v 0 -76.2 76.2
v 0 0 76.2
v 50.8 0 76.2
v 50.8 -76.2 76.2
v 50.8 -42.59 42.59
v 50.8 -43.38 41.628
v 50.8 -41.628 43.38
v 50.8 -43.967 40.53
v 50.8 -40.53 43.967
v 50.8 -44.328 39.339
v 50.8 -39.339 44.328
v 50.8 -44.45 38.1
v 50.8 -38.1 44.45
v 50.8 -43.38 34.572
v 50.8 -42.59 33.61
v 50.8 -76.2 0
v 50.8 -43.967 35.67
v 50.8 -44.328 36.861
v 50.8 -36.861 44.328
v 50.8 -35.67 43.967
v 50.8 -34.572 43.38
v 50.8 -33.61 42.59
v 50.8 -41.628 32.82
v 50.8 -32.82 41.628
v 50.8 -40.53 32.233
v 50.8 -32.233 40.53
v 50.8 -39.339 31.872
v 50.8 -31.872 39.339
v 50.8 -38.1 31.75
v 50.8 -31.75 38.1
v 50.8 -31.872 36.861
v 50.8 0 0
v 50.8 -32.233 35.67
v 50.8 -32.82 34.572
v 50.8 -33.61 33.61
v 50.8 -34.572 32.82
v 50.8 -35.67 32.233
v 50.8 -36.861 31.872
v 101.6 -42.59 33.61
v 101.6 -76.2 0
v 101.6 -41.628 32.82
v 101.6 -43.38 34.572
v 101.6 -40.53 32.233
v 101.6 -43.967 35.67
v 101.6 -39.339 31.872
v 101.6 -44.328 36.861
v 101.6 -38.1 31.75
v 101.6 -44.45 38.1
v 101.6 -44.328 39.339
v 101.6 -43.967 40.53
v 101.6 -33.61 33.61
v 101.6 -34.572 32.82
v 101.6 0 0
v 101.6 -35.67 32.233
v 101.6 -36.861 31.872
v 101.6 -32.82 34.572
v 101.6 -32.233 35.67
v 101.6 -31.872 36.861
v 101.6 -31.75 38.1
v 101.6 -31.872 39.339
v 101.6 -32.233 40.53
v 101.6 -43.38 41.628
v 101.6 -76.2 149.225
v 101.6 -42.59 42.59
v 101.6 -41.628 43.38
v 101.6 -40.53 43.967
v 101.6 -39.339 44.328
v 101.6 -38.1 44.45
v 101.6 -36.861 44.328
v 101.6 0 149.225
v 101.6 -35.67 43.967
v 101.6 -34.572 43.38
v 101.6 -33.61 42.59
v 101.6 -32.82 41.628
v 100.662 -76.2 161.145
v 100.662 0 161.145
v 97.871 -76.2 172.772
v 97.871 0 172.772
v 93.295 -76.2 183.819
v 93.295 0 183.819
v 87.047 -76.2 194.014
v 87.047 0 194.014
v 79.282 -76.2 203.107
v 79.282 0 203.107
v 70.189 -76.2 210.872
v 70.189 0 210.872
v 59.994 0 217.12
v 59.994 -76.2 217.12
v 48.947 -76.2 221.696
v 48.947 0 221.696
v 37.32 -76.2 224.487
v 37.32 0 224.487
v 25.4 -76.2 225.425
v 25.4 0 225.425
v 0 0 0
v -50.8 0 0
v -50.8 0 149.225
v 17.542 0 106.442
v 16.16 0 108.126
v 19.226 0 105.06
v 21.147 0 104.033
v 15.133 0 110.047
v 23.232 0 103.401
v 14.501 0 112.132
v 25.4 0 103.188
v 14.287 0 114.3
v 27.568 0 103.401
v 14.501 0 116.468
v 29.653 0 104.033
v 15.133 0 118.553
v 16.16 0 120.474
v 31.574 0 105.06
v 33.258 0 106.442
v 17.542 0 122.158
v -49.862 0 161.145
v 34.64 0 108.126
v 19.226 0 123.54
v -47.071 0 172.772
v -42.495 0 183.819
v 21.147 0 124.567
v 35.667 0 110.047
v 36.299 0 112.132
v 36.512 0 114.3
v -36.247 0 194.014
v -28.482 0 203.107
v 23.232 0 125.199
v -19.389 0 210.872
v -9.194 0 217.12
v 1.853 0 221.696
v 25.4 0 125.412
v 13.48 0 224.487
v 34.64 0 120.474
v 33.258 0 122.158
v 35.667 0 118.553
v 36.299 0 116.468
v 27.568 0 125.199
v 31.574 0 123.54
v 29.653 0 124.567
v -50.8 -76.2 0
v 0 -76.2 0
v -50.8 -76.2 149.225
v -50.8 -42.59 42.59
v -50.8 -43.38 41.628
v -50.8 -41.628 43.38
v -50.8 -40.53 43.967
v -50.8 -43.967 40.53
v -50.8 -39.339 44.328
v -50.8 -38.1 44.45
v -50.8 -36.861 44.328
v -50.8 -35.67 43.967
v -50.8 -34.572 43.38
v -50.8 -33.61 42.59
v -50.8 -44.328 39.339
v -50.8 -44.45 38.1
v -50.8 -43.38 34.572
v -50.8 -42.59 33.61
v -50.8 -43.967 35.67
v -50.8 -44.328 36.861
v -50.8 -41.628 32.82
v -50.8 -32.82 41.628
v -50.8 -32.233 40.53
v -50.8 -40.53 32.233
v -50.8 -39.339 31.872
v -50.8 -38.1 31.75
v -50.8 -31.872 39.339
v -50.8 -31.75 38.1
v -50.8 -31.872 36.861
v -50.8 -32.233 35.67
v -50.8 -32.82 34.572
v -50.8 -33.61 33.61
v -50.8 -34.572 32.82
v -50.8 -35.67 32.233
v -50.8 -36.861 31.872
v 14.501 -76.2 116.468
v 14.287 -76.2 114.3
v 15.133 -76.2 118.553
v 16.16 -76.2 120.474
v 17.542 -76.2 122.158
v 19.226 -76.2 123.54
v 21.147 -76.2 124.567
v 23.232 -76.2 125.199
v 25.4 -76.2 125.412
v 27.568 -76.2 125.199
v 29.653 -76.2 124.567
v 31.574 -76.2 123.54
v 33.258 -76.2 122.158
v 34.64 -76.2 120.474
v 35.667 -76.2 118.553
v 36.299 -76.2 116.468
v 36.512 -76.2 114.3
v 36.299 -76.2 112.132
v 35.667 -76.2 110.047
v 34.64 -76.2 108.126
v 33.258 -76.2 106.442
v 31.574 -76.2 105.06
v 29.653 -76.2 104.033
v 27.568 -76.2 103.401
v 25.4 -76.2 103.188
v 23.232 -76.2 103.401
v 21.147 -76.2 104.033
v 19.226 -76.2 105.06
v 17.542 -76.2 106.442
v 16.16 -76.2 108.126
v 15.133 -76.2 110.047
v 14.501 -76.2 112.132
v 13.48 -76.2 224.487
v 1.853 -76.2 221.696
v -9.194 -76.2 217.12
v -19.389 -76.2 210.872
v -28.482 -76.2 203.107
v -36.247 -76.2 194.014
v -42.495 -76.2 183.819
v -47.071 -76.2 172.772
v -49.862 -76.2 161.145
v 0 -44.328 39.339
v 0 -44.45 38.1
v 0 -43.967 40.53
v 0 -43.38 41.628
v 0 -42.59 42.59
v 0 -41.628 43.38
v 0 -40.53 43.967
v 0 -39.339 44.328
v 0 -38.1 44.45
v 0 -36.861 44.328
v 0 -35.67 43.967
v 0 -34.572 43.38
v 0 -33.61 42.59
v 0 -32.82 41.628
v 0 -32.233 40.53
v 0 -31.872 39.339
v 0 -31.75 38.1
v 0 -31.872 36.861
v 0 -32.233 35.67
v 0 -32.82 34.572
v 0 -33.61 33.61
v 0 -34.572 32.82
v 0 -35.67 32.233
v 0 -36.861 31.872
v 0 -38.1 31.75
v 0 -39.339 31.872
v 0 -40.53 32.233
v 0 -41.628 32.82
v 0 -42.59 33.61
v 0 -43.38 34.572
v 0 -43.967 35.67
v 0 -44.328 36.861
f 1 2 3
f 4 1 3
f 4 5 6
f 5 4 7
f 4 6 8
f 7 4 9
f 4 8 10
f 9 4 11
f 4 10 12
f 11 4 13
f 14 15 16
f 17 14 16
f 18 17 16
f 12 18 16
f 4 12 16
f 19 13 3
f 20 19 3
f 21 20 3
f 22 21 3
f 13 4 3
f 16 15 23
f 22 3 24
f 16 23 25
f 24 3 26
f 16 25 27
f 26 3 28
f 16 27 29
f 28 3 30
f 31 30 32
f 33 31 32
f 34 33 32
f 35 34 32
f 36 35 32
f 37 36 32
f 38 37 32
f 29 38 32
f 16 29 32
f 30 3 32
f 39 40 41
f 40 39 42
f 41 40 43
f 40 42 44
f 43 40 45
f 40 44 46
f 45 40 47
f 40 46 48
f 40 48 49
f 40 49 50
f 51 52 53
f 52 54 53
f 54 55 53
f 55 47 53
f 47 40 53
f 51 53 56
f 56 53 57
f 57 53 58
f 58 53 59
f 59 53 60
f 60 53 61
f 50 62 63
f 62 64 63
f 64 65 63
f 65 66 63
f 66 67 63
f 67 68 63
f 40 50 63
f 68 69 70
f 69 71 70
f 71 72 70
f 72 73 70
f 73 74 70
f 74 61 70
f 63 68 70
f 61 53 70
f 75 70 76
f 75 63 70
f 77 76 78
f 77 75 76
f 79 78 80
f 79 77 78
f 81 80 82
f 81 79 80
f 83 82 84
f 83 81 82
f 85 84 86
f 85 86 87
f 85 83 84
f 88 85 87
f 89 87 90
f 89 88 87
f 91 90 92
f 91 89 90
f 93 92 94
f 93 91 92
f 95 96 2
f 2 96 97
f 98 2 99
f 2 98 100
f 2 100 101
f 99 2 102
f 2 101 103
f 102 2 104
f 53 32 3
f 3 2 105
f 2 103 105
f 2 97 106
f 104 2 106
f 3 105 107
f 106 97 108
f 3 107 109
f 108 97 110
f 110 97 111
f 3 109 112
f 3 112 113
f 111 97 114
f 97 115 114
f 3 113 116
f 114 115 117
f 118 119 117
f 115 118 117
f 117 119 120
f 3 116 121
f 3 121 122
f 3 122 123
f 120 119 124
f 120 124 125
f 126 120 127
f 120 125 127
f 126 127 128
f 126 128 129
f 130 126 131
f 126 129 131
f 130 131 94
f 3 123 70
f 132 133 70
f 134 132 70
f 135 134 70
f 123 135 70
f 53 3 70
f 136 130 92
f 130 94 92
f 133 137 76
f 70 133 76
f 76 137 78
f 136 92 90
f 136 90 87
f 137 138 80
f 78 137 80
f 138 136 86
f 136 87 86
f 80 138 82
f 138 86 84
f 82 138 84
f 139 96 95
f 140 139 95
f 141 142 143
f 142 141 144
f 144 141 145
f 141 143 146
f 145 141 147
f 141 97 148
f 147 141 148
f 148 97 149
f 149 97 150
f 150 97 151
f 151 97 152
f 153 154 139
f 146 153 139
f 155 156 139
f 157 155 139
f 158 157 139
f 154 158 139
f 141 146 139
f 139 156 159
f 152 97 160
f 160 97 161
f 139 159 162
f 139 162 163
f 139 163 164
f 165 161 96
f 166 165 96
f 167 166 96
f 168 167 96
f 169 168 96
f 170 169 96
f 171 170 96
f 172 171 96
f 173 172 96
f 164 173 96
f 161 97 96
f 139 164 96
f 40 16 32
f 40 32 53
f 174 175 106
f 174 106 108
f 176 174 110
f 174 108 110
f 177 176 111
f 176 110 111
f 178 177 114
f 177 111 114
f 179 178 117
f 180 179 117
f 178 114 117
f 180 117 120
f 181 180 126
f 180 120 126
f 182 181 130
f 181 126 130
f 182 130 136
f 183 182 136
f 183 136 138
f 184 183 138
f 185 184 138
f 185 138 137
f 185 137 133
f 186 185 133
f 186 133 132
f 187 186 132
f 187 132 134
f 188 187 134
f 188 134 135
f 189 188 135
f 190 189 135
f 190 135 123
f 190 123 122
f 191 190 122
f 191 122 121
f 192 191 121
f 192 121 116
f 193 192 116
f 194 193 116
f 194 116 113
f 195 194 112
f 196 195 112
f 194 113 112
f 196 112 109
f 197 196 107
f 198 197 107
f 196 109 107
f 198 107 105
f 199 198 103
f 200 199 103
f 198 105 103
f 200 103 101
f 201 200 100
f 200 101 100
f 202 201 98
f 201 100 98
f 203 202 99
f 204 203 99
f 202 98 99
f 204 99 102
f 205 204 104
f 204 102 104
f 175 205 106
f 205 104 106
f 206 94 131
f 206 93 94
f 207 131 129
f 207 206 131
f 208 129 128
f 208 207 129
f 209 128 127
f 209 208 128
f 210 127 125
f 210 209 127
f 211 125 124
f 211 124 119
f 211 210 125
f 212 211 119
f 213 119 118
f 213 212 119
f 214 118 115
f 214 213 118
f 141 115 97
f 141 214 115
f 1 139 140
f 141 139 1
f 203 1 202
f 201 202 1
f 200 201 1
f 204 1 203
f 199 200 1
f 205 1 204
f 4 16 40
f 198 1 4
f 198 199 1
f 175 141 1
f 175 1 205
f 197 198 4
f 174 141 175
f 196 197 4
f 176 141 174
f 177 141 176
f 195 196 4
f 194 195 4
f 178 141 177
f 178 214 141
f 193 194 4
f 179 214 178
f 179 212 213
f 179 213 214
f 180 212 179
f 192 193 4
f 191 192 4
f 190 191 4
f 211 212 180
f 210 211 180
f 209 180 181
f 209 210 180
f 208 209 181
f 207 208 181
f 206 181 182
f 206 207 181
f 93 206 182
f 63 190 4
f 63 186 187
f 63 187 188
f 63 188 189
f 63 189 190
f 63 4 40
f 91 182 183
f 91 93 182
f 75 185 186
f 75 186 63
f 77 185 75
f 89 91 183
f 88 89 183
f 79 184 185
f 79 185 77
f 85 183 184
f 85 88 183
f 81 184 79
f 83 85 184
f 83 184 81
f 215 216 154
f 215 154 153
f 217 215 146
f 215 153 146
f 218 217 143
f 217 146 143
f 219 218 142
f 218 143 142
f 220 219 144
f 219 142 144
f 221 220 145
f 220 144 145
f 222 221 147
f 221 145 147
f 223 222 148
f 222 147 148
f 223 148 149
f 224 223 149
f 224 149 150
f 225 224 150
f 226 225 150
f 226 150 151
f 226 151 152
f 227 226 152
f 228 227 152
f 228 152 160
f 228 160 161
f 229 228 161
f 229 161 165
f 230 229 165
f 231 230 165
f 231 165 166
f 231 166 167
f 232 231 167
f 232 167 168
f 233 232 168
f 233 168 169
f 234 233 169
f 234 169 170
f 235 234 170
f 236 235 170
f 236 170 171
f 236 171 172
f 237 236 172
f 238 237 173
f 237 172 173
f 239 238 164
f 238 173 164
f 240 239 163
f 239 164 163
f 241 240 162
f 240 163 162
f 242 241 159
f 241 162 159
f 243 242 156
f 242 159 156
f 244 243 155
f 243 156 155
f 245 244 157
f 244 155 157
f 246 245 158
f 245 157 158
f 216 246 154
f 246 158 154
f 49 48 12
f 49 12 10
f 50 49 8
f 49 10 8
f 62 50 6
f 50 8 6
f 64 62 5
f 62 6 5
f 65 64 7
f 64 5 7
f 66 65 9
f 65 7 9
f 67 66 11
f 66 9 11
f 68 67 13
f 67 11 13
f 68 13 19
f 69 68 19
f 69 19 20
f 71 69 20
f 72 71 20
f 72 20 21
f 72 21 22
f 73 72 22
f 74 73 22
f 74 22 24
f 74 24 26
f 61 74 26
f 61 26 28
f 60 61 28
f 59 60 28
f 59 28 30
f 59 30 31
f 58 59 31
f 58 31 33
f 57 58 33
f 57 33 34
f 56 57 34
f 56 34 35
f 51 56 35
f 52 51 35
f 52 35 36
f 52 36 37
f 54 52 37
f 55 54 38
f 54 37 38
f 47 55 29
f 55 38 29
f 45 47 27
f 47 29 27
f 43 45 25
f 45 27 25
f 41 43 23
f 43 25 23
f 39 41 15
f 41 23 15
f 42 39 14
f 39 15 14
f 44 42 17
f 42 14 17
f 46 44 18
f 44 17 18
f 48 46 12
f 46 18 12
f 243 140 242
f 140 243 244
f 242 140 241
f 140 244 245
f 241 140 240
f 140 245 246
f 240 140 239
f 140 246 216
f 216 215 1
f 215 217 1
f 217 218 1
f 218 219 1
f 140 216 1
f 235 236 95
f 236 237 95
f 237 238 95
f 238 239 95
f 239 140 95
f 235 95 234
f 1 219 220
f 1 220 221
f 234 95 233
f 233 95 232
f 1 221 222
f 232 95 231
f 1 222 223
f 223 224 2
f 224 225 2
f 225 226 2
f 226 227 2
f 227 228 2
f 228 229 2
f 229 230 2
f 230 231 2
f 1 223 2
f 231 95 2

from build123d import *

# Parameters (mm, degrees)
F1_DEPTH = 76.2
F2_R     = 76.19999
F4_D     = 22.225
F6_D     = 12.7


# Not quite as in the source:
# - a fillet or chamfer is up to 0.001 mm smaller than in the source, because OpenCascade refuses the exact size


with BuildPart() as f1:
    # F0 (on Front) → F1 (new body)
    with BuildSketch(Plane.XZ):
        Polygon((-50.8, 0), (0, 0), (0, 76.2), (50.8, 76.2), (50.8, 0), (101.6, 0), (101.6, 225.425), (-50.8, 225.425), align=None)
    extrude(amount=F1_DEPTH)

    # F2 (radius 76.2 in the source; OpenCascade refuses exactly that, so slightly less here)
    f2_edges = [f1.edges().sort_by_distance(p)[0] for p in [
        (101.6, -38.1, 225.425),
        (-50.8, -38.1, 225.425),
    ]]
    fillet(f2_edges, radius=F2_R)

    # F4 (through all)
    with Locations(Plane.XZ.offset(76.2)):
        with Locations((25.4, 114.3)):
            Hole(F4_D / 2)

    # F6 (through all)
    with Locations(Plane.YZ.offset(101.6)):
        with Locations((-38.1, 38.1)):
            Hole(F6_D / 2)


solid = f1.part
